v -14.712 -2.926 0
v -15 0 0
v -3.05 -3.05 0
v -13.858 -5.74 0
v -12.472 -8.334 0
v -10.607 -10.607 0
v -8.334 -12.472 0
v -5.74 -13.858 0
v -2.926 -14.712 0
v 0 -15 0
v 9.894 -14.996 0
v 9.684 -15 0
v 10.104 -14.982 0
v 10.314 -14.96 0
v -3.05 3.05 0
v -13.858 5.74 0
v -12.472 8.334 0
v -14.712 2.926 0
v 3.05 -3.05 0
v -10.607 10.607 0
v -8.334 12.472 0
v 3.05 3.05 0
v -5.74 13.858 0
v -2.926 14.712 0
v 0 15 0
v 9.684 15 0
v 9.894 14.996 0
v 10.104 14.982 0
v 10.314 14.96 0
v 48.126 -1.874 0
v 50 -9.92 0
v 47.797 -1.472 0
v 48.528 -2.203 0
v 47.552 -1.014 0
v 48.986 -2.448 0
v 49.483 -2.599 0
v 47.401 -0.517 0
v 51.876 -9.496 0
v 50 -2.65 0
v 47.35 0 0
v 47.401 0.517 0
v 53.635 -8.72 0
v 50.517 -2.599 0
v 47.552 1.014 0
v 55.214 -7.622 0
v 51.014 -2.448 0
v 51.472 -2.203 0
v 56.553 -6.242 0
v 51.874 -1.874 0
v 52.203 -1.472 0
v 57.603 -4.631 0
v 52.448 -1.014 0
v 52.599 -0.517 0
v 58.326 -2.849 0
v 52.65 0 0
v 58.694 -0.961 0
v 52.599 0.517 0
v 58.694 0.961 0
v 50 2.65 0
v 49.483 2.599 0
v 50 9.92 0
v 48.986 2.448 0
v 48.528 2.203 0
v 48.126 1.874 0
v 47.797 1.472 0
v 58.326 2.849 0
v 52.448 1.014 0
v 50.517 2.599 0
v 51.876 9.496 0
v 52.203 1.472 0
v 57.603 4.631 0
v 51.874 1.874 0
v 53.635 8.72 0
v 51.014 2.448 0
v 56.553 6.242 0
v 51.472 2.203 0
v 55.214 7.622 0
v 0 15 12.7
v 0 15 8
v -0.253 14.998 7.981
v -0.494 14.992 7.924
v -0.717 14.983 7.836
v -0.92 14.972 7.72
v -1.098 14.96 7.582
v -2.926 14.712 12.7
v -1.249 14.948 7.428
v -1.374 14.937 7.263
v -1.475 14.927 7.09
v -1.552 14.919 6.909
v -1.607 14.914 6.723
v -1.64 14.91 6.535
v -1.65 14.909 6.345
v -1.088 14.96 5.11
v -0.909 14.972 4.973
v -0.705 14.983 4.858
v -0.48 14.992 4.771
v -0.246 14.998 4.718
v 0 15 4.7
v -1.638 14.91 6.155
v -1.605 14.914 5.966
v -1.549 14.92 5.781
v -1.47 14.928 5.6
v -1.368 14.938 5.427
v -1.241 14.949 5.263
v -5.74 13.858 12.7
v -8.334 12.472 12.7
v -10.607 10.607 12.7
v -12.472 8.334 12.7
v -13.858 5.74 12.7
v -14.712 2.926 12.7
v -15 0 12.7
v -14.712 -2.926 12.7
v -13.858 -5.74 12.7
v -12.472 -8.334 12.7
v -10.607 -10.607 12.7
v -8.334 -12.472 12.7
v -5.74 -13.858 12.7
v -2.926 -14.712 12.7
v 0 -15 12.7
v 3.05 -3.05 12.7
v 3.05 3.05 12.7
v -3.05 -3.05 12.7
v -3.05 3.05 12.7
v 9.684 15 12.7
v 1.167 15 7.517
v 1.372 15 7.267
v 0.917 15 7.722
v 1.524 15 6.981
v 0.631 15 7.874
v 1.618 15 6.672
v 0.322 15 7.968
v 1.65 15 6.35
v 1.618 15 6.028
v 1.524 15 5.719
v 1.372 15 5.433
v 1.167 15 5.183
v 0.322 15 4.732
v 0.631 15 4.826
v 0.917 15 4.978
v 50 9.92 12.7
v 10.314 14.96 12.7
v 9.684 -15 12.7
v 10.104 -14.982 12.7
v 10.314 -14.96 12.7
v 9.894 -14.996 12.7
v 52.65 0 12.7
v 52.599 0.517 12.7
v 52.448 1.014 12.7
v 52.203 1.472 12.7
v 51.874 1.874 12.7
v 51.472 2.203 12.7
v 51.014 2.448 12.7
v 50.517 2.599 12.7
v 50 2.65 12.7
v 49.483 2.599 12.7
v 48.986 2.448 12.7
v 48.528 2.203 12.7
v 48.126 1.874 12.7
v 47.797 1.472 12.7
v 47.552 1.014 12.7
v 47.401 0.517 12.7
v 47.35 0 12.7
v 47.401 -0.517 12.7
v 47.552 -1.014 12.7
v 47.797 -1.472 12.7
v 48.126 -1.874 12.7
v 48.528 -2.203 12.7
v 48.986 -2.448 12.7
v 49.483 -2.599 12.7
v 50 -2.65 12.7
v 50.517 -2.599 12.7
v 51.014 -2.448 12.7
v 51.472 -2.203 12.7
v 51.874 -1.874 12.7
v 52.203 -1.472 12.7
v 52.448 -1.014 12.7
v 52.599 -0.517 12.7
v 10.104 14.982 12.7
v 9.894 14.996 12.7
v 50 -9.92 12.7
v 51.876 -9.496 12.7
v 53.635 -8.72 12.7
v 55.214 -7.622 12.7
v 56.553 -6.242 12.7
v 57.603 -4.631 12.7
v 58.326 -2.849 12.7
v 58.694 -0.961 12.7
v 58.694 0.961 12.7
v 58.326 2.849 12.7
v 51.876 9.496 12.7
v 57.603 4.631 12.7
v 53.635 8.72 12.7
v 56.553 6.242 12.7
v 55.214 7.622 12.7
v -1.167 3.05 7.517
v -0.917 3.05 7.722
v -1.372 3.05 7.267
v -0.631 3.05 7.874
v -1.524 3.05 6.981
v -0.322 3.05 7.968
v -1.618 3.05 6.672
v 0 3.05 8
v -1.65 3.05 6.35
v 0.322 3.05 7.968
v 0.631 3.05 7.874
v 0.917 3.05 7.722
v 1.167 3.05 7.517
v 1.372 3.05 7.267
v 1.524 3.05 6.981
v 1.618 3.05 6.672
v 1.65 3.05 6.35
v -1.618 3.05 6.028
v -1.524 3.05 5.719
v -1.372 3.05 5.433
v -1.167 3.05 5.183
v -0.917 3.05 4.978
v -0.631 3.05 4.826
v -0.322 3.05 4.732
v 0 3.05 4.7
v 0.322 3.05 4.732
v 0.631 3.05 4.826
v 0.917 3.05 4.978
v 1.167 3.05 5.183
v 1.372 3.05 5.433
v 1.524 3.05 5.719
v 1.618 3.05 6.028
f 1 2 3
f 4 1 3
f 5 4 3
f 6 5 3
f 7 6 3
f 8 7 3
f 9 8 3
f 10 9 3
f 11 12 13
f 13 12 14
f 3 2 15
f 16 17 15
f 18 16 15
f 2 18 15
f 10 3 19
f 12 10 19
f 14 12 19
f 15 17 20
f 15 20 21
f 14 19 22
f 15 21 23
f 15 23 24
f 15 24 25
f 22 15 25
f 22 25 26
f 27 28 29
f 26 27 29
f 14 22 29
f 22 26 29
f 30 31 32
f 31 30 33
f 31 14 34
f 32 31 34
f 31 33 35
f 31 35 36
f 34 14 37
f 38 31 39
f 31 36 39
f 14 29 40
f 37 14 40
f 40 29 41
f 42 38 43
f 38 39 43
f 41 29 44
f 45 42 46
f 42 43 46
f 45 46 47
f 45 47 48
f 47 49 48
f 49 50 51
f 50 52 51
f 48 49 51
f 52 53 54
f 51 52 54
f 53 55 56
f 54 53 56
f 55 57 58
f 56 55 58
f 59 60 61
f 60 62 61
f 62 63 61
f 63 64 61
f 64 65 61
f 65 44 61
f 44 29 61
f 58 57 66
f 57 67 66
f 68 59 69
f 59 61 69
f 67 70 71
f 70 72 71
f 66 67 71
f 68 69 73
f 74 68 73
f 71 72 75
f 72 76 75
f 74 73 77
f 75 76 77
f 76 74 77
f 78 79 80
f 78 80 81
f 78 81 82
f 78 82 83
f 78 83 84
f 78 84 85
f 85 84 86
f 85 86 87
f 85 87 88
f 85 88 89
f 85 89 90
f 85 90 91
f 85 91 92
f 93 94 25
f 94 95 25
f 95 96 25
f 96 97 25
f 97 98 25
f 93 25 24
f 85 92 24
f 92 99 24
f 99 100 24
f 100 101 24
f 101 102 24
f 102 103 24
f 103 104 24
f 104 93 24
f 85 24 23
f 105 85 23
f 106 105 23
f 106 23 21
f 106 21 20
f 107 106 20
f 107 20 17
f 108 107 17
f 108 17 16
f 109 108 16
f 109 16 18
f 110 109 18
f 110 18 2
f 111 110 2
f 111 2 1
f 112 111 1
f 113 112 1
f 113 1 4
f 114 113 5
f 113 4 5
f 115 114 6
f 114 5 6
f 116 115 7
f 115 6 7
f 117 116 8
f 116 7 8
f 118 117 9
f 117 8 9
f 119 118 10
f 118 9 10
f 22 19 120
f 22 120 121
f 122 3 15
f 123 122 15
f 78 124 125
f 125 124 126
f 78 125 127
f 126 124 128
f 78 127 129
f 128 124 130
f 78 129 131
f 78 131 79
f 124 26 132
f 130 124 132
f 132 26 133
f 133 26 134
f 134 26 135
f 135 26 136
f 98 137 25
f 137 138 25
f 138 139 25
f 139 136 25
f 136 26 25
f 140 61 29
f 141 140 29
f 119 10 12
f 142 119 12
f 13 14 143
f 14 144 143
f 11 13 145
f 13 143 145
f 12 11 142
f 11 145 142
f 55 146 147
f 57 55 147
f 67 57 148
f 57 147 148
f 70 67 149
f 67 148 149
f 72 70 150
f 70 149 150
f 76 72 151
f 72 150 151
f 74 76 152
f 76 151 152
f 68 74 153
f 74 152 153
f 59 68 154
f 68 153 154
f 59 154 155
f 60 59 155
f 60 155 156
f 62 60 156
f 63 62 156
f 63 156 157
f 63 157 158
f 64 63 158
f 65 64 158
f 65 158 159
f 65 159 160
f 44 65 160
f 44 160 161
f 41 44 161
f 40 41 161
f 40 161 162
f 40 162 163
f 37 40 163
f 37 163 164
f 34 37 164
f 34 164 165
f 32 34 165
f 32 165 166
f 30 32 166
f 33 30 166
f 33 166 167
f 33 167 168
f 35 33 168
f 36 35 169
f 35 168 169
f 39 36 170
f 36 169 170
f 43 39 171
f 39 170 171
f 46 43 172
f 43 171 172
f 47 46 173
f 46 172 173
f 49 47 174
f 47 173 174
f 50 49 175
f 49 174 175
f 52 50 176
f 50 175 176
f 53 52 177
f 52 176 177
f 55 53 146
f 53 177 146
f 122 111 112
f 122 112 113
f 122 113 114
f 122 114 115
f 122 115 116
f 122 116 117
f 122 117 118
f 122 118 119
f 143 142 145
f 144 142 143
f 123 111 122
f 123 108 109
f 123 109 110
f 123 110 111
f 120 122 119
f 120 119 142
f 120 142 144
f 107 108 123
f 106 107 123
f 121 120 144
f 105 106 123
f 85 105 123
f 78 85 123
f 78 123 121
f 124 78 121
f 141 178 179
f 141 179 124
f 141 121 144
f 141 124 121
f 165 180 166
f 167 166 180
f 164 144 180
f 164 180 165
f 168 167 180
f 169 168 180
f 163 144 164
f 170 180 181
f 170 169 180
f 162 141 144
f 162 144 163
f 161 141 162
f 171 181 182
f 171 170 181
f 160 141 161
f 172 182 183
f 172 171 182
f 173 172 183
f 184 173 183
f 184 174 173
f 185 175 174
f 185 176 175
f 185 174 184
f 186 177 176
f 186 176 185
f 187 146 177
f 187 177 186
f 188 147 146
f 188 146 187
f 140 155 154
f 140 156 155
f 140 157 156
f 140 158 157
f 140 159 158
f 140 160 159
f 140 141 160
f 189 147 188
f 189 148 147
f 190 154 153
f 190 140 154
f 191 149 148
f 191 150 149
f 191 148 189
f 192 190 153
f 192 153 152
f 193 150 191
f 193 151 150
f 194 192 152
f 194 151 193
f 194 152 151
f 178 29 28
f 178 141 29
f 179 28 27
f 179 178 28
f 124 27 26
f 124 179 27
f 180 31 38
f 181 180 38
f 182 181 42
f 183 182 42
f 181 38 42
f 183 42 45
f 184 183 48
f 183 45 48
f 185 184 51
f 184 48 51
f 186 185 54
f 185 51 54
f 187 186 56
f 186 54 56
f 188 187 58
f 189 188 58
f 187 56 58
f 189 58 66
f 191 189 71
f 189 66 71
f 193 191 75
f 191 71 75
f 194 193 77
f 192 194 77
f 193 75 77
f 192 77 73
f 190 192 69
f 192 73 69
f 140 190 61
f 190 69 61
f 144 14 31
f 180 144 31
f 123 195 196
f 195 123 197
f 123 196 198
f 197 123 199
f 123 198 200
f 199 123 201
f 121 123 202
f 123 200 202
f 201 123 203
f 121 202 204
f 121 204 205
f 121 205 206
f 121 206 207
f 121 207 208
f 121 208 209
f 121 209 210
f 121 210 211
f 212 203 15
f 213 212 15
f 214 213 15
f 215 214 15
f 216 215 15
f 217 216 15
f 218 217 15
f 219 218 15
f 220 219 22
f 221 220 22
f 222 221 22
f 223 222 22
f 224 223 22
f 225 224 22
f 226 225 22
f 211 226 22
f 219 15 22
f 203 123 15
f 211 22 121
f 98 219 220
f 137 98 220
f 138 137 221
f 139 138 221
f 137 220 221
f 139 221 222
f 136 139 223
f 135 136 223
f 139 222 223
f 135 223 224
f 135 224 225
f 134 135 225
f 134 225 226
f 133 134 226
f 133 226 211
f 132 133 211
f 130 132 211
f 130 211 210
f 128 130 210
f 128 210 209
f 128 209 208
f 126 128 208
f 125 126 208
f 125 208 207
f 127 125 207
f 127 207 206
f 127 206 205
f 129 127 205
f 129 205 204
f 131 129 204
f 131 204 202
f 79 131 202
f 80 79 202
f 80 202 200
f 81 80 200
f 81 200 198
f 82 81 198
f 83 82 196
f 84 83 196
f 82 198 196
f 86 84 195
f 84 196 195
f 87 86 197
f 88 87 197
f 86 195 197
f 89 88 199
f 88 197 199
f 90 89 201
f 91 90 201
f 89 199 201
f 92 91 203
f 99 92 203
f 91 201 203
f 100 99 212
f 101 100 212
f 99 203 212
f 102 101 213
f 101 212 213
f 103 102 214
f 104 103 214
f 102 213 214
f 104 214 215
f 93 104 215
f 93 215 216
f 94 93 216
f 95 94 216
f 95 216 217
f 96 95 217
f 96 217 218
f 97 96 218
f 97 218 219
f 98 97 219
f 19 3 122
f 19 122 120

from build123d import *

# Parameters (mm, degrees)
SKETCH1_W                       = 6.1
SKETCH1_H                       = 6.1
BOSS_EXTRUDE1_DEPTH             = 12.7
TAP_DRILL_FOR_M4X0_7_TAP1_D     = 3.3
TAP_DRILL_FOR_M4X0_7_TAP1_DEPTH = 11.95
M5_CLEARANCE_HOLE1_D            = 5.3
FILLET1_R                       = 5


with BuildPart() as part:
    # Sketch1 → Boss-Extrude1 (new body)
    with BuildSketch(Plane.XY):
        with BuildLine():
            Line((50, 9.920327772), (10, 15))
            Line((10, 15), (0, 15))
            ThreePointArc((0, 15), (-15, 0), (0, -15))
            Line((0, -15), (10, -15))
            Line((10, -15), (50, -9.920327772))
            ThreePointArc((50, -9.920327772), (58.740199663, 0), (50, 9.920327772))
        make_face()
        Rectangle(SKETCH1_W, SKETCH1_H, mode=Mode.SUBTRACT)
    extrude(amount=BOSS_EXTRUDE1_DEPTH)

    # Tap Drill for M4x0.7 Tap1
    with Locations(Plane(origin=(0, 15, 6.35), x_dir=(0, 0, 1), z_dir=(0, 1, 0))):
        with Locations((0, 0)):
            Hole(TAP_DRILL_FOR_M4X0_7_TAP1_D / 2, depth=TAP_DRILL_FOR_M4X0_7_TAP1_DEPTH)

    # M5 Clearance Hole1 (through all)
    with Locations(Plane(origin=(50, 0, 0), x_dir=(-1, 0, 0), z_dir=(0, 0, -1))):
        with Locations((0, 0)):
            Hole(M5_CLEARANCE_HOLE1_D / 2)

    # Fillet1
    fillet1_edges = [part.edges().sort_by_distance(p)[0] for p in [
        (10, 15, 6.35),
        (10, -15, 6.35),
    ]]
    fillet(fillet1_edges, radius=FILLET1_R)


solid = part.part
